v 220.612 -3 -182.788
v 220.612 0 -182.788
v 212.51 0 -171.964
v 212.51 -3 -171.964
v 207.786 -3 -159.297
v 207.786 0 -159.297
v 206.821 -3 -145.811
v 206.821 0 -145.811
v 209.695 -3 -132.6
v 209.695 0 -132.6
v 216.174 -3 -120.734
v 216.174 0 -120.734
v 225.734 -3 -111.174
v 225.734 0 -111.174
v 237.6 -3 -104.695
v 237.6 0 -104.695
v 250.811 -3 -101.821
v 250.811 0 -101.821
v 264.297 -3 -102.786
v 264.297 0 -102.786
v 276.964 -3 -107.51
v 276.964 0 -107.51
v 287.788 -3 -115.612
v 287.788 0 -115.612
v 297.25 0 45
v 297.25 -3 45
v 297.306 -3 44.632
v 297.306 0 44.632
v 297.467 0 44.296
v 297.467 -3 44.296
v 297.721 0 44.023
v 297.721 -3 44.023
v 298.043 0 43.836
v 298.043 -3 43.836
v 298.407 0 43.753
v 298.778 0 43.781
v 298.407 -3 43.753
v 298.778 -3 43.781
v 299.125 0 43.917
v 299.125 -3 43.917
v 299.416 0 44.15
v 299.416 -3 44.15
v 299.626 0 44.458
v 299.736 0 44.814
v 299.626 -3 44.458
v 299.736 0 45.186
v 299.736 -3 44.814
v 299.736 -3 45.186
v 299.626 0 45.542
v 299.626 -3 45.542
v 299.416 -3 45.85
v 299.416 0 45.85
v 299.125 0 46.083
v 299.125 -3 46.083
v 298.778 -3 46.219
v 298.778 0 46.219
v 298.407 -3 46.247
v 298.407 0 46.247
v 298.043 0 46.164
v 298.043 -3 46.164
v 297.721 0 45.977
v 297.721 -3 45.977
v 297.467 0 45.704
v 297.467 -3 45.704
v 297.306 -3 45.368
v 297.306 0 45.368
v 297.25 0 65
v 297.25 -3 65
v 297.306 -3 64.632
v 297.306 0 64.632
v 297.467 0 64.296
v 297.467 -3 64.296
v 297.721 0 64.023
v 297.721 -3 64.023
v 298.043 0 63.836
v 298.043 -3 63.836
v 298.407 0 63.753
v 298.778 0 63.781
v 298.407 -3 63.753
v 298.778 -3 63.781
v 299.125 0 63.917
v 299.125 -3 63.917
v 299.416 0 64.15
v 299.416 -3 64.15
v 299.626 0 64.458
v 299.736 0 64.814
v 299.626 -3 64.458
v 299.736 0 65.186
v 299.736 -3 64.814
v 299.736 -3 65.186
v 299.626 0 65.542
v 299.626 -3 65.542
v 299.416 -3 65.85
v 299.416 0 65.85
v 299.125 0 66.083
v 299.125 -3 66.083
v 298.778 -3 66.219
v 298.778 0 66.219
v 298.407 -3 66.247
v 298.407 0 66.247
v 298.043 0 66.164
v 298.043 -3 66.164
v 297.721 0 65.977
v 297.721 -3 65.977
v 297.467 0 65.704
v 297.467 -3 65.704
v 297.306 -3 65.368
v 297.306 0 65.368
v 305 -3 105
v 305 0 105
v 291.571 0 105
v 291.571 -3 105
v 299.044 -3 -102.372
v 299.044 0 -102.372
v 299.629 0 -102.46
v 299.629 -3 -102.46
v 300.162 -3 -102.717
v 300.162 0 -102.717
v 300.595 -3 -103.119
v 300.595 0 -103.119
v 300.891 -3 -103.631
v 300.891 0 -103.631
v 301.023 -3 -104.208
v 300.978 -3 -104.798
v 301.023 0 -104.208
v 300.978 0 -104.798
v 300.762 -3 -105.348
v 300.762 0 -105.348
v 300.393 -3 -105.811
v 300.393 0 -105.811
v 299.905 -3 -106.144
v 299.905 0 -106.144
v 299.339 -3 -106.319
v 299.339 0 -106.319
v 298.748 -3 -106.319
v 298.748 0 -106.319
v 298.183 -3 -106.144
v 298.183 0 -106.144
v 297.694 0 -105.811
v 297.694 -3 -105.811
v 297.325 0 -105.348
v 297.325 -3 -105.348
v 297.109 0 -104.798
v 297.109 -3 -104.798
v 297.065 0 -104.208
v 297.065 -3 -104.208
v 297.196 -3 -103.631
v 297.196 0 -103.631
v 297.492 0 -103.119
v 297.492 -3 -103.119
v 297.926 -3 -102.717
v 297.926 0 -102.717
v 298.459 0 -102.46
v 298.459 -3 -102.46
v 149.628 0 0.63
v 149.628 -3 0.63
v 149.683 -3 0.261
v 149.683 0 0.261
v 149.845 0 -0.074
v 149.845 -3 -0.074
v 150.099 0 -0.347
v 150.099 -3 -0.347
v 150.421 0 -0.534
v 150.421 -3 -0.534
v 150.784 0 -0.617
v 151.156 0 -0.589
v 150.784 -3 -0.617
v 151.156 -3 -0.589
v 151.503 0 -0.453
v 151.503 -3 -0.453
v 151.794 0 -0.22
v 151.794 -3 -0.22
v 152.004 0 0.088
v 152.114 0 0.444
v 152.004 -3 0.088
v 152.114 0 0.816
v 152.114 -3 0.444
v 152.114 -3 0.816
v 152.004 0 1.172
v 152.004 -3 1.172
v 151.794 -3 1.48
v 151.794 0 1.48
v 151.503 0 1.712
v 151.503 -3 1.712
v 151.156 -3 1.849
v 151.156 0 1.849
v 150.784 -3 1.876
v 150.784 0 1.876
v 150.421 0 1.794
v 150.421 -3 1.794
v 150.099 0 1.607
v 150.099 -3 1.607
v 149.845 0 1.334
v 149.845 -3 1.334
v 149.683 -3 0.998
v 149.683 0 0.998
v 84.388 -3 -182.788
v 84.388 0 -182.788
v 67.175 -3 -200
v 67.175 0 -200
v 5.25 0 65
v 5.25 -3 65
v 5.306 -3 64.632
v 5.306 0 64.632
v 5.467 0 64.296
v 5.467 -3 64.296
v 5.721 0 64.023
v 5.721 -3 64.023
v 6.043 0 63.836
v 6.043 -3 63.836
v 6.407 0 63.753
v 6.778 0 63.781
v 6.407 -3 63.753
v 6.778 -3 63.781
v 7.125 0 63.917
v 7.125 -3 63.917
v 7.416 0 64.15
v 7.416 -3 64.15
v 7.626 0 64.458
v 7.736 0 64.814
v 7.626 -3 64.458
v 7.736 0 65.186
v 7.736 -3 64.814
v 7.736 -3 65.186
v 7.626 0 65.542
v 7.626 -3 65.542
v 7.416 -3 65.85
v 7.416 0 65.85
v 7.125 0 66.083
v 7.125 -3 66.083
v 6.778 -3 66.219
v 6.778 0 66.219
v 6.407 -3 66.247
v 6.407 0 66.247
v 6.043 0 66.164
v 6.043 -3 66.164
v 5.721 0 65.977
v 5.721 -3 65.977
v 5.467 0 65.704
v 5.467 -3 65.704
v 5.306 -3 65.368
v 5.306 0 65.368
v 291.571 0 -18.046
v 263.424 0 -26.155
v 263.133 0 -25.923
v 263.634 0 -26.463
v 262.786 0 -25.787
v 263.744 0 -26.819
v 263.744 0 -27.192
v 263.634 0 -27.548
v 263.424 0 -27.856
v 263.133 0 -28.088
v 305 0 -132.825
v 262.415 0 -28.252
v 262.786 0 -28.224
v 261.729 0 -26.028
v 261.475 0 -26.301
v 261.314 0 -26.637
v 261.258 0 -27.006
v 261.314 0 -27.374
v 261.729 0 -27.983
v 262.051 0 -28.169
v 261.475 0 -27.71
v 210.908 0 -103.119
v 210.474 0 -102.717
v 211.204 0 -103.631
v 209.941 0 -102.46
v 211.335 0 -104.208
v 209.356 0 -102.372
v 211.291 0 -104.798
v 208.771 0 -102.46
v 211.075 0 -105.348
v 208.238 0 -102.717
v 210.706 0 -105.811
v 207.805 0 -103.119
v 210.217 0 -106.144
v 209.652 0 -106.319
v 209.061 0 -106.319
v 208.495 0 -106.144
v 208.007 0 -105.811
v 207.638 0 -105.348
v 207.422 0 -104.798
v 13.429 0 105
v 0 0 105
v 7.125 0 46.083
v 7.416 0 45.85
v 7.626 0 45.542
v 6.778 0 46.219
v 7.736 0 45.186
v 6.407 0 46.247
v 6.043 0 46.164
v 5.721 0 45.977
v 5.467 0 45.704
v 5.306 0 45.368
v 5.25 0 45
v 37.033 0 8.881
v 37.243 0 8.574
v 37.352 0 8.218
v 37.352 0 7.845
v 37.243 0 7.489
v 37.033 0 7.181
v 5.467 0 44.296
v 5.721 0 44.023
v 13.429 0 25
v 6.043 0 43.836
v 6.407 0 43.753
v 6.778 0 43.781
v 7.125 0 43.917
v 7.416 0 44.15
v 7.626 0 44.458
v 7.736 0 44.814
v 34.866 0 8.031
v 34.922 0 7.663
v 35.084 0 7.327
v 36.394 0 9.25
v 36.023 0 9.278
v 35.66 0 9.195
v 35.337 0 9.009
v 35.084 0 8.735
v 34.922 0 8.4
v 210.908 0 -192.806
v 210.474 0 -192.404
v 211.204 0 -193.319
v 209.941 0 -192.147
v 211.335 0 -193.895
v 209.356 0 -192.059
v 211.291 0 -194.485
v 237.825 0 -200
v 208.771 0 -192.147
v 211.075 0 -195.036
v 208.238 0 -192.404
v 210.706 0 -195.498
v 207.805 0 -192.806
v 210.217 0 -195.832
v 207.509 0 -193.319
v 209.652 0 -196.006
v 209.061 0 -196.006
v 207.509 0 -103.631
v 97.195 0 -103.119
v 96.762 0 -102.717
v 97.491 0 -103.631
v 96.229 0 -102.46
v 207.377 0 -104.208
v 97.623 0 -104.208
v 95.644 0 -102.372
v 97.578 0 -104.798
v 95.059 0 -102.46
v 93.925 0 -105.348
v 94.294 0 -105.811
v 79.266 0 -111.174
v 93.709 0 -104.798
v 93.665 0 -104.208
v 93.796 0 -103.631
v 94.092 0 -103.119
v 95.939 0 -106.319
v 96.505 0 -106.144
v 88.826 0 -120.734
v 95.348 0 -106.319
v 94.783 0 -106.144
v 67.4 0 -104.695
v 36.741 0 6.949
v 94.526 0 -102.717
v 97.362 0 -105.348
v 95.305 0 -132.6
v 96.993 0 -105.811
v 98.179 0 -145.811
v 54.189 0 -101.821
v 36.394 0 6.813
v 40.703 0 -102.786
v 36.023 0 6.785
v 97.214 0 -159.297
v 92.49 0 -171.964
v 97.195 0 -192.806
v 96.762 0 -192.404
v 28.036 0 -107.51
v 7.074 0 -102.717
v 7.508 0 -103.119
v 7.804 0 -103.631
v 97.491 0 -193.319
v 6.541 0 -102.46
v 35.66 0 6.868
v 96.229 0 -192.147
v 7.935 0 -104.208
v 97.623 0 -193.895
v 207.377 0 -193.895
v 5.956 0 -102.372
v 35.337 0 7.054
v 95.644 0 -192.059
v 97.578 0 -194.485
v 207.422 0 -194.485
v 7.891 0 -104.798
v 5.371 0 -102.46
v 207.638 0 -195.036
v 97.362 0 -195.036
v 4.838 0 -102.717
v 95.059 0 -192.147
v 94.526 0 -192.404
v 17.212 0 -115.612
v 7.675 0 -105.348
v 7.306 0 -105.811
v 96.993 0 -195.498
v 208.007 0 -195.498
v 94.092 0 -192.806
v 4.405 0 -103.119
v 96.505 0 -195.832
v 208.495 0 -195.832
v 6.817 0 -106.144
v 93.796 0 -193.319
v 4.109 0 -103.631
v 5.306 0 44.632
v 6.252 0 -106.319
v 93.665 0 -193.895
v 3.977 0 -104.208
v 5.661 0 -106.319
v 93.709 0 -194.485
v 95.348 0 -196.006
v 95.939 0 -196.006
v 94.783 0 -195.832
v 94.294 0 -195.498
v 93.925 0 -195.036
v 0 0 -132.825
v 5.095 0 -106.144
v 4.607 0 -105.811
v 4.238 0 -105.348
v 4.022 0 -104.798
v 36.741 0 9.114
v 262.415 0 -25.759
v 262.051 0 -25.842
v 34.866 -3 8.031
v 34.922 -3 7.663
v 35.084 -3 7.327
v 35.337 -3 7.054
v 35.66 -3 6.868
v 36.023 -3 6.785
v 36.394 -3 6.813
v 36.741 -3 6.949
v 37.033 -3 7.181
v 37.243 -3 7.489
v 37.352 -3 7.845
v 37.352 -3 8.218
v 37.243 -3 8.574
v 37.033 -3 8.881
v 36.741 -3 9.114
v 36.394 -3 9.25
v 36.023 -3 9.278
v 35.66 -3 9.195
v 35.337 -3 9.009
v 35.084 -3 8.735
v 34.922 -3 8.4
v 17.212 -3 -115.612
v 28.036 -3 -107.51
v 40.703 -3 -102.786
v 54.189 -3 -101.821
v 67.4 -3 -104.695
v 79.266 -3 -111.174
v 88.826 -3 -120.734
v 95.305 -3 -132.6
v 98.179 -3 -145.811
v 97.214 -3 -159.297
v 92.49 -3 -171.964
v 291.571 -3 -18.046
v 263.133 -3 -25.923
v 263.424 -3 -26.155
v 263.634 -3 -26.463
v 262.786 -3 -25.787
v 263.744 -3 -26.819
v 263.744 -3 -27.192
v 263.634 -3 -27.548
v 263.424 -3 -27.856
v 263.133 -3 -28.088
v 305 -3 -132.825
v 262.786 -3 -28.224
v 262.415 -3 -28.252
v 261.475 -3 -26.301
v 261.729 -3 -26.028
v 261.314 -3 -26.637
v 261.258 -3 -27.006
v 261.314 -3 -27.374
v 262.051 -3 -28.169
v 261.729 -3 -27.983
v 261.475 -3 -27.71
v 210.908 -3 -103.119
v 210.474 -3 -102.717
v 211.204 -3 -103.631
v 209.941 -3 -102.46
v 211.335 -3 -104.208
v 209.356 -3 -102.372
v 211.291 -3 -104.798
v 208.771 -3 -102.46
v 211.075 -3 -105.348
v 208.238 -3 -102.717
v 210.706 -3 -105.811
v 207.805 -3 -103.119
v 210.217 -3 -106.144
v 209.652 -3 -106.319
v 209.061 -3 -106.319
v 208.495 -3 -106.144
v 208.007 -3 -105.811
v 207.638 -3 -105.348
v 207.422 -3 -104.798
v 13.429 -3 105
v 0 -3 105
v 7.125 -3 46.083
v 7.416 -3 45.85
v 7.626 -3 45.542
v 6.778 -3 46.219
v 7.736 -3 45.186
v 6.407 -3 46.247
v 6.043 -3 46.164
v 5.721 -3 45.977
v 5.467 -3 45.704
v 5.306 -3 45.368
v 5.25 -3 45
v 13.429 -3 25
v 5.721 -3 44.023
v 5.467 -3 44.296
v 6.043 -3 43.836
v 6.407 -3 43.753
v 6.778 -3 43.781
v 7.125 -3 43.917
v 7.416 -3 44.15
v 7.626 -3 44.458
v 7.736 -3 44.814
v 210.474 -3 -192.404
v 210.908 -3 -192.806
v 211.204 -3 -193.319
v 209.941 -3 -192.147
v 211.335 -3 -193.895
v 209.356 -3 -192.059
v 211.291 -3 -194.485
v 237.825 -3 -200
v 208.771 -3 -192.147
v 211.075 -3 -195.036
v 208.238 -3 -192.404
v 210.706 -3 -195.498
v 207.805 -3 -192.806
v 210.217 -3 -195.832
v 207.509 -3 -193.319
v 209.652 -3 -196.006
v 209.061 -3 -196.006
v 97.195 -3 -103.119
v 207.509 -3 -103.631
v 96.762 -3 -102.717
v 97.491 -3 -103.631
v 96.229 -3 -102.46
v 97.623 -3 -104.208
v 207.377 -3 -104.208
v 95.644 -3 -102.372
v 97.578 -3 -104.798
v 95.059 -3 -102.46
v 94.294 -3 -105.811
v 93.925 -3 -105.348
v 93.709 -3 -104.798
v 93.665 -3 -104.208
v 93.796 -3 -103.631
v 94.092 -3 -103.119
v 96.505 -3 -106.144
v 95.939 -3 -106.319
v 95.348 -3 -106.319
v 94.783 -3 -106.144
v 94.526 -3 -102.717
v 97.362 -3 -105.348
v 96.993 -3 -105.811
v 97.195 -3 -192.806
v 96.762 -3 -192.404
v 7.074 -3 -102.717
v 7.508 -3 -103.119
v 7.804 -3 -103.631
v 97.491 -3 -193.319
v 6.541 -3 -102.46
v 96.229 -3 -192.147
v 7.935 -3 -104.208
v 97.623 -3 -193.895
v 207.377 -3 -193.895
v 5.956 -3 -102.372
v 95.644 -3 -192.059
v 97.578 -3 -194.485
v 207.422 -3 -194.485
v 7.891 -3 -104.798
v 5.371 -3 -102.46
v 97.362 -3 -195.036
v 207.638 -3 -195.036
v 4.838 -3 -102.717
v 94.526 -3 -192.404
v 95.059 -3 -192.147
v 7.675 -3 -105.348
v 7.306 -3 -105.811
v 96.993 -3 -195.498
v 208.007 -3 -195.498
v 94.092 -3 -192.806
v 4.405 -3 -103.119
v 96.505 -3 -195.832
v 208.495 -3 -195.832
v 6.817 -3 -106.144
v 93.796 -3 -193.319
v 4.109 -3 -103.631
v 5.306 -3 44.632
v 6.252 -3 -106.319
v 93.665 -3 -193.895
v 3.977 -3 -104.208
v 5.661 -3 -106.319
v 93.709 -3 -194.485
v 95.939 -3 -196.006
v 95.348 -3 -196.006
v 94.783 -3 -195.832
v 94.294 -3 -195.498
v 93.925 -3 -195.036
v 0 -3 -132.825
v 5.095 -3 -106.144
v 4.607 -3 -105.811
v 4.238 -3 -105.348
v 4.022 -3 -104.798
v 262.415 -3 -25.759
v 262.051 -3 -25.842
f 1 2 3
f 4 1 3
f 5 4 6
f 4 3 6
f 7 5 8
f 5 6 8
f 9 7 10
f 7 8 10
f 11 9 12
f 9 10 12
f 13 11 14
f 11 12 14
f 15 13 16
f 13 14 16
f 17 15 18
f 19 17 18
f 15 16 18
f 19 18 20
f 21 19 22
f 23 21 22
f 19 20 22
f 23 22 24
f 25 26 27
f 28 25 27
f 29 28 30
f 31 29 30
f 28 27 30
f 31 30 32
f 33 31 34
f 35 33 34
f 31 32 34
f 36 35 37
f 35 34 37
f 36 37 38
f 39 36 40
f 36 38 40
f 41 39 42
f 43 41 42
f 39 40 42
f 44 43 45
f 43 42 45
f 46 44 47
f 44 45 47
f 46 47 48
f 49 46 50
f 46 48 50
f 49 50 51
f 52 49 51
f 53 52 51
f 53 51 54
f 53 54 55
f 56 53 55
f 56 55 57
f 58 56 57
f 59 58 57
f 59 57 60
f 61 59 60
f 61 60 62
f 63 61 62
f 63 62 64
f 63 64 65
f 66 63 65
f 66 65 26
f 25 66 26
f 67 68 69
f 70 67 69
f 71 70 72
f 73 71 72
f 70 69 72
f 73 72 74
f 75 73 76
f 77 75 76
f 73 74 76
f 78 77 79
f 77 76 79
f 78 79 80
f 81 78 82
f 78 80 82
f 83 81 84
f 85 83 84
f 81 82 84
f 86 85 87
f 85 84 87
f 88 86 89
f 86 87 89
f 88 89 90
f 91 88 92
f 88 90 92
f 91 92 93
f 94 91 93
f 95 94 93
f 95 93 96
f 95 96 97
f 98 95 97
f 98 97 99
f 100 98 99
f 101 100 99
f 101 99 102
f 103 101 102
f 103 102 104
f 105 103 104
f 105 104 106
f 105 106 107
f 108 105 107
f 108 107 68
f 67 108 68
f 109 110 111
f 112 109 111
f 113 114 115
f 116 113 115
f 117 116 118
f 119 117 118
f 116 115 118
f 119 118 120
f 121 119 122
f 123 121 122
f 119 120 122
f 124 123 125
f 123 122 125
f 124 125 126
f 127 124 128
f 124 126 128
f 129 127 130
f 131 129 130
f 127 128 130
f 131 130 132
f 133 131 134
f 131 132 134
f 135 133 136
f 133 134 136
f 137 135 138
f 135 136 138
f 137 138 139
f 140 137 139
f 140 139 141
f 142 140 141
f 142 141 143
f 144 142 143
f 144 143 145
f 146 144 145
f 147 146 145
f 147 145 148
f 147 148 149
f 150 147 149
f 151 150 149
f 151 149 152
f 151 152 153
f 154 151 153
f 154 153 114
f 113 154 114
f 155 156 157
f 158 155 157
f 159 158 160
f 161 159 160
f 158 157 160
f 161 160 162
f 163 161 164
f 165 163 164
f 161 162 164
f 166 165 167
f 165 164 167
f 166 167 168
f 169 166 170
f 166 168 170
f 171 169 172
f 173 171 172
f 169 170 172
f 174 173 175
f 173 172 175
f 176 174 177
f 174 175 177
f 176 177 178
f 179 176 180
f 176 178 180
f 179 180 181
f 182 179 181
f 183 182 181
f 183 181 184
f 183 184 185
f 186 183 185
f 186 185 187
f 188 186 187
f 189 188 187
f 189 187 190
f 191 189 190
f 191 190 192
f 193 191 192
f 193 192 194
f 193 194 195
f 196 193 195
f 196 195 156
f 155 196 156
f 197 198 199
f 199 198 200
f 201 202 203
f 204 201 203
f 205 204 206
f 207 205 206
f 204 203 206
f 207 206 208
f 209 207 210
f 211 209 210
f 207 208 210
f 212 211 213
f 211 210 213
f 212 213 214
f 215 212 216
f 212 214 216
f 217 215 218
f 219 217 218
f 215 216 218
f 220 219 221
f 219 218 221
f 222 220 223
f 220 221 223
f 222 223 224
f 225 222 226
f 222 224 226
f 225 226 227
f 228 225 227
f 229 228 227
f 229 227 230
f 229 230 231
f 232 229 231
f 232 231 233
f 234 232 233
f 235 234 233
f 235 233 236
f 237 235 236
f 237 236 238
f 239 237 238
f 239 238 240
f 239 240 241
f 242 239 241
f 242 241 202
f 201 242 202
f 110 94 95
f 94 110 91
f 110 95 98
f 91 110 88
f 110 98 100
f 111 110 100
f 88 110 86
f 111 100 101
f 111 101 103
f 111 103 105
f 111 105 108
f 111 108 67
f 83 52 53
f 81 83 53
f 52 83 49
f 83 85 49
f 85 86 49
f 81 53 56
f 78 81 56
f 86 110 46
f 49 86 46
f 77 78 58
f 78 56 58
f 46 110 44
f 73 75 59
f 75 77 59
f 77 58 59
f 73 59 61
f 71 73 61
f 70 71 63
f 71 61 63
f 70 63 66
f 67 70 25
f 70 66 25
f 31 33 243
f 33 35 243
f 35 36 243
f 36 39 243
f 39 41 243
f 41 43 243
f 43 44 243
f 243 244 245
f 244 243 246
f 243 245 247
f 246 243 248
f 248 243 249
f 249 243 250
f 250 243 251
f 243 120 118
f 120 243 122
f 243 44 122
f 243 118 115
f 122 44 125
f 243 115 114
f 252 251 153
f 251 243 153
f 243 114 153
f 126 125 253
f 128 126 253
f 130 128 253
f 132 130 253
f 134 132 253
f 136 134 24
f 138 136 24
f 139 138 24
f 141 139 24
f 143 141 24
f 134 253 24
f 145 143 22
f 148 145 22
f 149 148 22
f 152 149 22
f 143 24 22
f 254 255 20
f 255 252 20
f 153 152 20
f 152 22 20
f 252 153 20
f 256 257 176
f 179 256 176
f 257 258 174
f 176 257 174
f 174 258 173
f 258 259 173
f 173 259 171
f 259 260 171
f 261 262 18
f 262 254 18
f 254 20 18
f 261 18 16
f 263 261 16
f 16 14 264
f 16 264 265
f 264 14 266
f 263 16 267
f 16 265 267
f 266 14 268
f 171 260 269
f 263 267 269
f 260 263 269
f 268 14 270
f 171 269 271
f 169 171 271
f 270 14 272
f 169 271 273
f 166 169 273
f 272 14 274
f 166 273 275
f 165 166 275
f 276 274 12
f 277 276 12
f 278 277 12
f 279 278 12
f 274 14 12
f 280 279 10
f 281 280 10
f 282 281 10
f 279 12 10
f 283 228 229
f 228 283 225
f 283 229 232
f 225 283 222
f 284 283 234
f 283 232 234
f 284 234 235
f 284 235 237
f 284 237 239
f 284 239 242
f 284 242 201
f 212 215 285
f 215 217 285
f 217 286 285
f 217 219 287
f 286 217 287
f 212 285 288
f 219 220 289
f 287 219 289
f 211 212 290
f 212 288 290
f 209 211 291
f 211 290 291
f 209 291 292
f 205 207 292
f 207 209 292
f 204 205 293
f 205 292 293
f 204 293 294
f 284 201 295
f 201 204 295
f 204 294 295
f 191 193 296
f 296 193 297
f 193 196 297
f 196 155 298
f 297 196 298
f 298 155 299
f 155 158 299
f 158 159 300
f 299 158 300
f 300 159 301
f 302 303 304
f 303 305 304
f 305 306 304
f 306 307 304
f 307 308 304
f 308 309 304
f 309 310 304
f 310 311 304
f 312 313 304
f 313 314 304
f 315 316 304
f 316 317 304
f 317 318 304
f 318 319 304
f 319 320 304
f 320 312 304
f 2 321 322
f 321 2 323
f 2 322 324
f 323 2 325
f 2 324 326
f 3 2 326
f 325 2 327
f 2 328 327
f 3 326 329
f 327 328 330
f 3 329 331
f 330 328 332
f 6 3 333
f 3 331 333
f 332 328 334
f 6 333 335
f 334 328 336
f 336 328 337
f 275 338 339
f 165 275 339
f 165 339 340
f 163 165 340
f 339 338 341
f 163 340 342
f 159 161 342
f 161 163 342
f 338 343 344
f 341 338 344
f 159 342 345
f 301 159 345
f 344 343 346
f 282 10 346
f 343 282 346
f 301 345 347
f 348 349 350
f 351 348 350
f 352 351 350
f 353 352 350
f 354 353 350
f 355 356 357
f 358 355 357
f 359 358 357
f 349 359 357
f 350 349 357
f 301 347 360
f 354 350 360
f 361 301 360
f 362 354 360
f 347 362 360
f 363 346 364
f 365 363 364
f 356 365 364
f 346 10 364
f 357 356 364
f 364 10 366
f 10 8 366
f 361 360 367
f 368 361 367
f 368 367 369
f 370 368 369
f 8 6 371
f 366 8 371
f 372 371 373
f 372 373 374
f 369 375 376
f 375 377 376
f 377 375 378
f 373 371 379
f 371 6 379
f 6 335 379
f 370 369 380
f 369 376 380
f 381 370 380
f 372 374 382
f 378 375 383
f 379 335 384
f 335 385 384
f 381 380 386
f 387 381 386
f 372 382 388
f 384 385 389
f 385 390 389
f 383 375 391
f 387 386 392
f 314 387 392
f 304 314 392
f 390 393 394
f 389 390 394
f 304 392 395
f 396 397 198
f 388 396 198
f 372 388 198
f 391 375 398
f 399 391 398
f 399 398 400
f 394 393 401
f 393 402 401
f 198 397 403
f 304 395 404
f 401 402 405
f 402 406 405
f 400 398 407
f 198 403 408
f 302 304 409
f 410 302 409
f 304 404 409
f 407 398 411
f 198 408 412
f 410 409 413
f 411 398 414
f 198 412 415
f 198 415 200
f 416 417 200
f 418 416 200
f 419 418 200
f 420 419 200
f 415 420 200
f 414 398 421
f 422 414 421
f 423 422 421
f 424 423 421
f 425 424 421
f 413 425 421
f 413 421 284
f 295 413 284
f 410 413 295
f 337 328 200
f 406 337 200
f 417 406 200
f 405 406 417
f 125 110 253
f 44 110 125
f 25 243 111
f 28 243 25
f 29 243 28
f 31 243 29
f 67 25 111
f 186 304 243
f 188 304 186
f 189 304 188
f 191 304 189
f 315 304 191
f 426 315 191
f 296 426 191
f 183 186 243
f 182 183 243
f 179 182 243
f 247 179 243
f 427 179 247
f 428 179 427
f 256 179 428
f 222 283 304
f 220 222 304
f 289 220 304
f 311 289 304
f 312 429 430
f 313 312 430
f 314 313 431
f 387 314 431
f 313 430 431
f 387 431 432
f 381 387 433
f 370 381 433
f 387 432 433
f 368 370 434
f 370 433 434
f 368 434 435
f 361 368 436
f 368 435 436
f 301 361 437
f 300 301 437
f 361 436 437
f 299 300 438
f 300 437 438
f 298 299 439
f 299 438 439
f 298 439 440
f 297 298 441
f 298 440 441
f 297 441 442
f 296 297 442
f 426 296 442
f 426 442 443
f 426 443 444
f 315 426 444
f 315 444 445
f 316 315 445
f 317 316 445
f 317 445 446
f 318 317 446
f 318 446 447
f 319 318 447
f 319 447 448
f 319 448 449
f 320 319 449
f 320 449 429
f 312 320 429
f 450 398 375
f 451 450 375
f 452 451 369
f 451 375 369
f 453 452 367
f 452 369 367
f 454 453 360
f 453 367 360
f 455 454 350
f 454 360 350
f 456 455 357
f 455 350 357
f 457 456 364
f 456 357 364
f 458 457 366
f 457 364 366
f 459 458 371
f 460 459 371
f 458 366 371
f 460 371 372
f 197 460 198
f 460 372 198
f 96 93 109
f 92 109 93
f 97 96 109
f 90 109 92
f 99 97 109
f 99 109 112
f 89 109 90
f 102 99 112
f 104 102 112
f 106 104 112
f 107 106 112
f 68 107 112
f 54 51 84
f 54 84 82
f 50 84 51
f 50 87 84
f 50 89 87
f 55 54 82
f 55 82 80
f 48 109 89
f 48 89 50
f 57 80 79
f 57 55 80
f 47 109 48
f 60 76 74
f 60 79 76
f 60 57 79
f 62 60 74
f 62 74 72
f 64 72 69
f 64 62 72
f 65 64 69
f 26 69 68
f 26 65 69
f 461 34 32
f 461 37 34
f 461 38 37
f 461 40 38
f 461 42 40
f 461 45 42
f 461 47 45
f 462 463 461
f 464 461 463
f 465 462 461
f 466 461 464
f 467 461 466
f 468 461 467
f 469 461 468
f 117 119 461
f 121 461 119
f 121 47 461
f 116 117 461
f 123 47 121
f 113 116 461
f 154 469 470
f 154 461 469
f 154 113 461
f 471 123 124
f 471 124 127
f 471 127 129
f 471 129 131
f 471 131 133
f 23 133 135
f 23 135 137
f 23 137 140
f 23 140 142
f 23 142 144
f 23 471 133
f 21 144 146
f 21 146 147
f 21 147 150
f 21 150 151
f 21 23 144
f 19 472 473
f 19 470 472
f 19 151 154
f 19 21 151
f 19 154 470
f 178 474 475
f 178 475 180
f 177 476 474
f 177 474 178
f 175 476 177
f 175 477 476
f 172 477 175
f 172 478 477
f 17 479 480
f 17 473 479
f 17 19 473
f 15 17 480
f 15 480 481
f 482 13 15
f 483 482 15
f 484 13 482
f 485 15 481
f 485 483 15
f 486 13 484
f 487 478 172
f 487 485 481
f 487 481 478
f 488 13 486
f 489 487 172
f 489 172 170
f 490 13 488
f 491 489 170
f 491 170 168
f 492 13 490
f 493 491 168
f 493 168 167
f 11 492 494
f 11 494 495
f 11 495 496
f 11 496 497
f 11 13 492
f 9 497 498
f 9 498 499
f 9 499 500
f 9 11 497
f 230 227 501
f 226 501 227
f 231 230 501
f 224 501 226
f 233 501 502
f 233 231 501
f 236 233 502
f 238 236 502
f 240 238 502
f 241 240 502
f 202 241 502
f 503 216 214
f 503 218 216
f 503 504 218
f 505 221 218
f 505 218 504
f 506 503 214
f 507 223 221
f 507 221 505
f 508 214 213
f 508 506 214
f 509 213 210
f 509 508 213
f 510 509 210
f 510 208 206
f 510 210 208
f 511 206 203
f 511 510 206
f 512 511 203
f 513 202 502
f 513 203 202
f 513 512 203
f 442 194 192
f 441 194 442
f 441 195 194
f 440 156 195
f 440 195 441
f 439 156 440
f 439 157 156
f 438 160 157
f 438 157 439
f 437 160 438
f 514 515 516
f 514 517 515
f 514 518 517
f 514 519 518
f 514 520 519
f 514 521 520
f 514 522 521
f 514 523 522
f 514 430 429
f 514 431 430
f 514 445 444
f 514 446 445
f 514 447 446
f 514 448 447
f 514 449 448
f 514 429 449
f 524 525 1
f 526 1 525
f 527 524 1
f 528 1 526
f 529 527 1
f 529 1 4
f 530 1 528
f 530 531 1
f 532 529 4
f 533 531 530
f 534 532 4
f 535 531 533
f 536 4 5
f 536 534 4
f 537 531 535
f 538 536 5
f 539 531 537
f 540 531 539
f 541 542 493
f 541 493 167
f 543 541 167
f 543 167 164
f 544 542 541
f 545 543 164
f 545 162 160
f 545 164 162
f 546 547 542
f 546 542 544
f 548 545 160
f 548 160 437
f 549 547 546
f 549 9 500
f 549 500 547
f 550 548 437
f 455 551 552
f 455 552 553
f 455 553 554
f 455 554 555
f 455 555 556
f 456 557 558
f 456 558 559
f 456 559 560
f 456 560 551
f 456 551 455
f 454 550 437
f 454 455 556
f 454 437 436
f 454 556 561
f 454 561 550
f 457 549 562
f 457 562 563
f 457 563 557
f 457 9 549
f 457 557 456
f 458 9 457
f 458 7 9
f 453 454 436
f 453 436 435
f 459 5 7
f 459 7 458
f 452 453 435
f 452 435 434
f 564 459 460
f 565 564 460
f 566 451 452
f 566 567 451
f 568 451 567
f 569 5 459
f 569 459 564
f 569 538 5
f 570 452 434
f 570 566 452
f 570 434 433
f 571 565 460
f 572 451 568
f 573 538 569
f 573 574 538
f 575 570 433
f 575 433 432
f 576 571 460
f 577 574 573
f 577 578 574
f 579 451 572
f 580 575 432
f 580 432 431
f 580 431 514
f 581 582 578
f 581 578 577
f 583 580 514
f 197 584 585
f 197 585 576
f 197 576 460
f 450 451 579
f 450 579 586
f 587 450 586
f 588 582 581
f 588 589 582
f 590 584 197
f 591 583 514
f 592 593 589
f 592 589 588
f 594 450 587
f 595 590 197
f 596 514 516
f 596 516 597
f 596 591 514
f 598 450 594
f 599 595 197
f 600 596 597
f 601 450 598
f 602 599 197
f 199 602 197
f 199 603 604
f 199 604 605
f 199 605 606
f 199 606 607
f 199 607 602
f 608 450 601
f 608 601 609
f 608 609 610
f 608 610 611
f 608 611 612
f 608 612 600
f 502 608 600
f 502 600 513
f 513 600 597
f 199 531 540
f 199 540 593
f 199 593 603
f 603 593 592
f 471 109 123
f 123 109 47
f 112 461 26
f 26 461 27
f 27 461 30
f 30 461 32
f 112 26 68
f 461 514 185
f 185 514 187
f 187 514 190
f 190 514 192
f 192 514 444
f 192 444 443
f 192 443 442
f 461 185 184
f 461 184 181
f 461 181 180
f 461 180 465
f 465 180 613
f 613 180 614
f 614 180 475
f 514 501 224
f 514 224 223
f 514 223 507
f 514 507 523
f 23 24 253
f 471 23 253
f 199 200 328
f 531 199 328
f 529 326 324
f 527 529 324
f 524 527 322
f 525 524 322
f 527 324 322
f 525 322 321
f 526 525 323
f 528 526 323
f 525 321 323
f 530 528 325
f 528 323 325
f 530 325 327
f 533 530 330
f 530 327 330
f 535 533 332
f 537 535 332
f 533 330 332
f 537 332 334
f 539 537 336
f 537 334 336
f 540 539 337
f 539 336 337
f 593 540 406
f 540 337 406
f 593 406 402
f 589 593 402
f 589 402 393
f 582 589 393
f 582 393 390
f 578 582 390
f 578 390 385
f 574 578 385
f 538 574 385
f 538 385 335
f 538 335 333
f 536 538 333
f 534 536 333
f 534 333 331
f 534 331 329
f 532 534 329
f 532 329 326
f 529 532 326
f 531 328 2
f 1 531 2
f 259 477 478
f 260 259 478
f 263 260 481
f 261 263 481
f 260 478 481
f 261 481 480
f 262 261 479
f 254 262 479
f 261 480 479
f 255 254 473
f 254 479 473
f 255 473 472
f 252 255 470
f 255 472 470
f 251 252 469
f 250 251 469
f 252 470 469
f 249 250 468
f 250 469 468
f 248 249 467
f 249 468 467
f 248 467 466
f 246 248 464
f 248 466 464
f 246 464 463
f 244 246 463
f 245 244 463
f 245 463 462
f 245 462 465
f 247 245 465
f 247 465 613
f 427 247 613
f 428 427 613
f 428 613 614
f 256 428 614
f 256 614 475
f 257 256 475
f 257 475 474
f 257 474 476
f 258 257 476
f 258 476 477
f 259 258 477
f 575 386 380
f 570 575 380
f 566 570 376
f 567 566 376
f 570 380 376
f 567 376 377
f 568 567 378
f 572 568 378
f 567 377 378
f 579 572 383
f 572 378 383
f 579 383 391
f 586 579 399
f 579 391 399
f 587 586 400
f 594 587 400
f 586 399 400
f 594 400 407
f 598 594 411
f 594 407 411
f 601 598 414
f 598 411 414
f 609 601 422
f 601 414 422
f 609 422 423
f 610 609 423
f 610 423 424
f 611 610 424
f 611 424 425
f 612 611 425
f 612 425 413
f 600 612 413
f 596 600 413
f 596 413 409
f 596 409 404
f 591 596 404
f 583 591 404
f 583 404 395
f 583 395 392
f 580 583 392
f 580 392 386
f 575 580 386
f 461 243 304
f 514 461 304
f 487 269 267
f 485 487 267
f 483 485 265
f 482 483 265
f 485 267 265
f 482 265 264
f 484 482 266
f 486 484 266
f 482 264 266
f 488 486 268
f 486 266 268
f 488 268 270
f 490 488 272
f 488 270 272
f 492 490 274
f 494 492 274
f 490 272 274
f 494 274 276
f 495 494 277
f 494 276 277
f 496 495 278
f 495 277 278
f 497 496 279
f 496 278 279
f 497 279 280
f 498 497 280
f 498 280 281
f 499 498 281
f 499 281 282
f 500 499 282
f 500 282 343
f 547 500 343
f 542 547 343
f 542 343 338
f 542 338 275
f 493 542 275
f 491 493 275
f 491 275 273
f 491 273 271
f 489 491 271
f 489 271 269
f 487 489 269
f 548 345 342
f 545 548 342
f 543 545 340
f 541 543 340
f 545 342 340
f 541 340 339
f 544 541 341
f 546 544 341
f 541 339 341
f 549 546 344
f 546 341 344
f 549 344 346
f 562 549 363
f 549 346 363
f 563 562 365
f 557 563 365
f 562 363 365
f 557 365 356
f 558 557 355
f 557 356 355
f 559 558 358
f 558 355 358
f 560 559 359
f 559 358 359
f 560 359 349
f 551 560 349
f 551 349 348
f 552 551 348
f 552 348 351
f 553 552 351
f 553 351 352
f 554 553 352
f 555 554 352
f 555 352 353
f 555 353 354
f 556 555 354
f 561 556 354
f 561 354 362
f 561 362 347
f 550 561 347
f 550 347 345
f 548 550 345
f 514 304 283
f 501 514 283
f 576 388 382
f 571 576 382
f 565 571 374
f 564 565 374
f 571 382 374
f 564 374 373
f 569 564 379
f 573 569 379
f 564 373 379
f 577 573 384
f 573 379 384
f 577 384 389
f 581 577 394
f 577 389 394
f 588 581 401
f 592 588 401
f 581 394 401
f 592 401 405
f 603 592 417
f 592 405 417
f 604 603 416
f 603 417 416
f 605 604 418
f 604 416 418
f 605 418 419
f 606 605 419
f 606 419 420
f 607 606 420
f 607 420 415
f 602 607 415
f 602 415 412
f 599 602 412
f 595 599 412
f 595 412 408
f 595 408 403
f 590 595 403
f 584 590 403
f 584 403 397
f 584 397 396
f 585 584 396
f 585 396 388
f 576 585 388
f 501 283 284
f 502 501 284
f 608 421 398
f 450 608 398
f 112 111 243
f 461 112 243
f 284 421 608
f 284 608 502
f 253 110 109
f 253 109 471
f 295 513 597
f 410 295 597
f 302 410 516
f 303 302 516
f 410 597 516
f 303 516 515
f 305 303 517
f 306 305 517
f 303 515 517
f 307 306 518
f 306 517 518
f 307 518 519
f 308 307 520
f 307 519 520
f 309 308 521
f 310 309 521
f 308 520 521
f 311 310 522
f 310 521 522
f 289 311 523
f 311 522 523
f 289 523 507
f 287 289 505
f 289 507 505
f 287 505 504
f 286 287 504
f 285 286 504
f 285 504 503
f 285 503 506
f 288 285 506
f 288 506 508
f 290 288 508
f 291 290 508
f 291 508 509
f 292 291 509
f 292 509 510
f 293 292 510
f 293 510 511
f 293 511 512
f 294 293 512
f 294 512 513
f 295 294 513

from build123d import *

# Parameters (mm, degrees)
BASE_FLANGE1_DEPTH    = 3
M3_TAPPED_HOLE1_D     = 2.5
M3_TAPPED_HOLE1_DEPTH = 7.5
M3_TAPPED_HOLE1_TIP   = 0.751075774
M3_TAPPED_HOLE2_D     = 2.5
M3_TAPPED_HOLE2_DEPTH = 7.5
M3_TAPPED_HOLE2_TIP   = 0.751075774
SKETCH11_R            = 47.5
SKETCH11_R_2          = 1.984375
CUT_EXTRUDE1_DEPTH    = 365.73826232


# Sheet-metal steps are written as plain solids
with BuildPart() as part:
    # Sketch1 → Base-Flange1 (new body)
    with BuildSketch(Plane(origin=(0, 0, 0), x_dir=(1, 0, 0), z_dir=(0, 1, 0))):
        Polygon((0, 0), (0, 200), (305, 200), (305, 35.309832976), (305, -105), (291.57115, -105), (291.57115, 18.045832093), (13.42885, -25), (13.42885, -105), (0, -105), align=None)
    extrude(amount=-BASE_FLANGE1_DEPTH)

    # M3 Tapped Hole1
    with Locations(Plane(origin=(0, 0, 0), x_dir=(1, 0, 0), z_dir=(0, 1, 0))):
        with Locations((6.5, -45), (6.5, -65), (298.5, -45), (298.5, -65)):
            Hole(M3_TAPPED_HOLE1_D / 2, depth=M3_TAPPED_HOLE1_DEPTH)
            with Locations((0, 0, -(M3_TAPPED_HOLE1_DEPTH + M3_TAPPED_HOLE1_TIP / 2))):  # 118° drill point
                Cone(0, M3_TAPPED_HOLE1_D / 2, M3_TAPPED_HOLE1_TIP, mode=Mode.SUBTRACT)

    # M3 Tapped Hole2
    with Locations(Plane(origin=(0, 0, 0), x_dir=(1, 0, 0), z_dir=(0, 1, 0))):
        with Locations((36.116318069, -8.031256885), (150.87789947, -0.629943868), (262.508000343, 27.005551046)):
            Hole(M3_TAPPED_HOLE2_D / 2, depth=M3_TAPPED_HOLE2_DEPTH)
            with Locations((0, 0, -(M3_TAPPED_HOLE2_DEPTH + M3_TAPPED_HOLE2_TIP / 2))):  # 118° drill point
                Cone(0, M3_TAPPED_HOLE2_D / 2, M3_TAPPED_HOLE2_TIP, mode=Mode.SUBTRACT)

    # Sketch11 → Cut-Extrude1 (cut, through all)
    with BuildSketch(Plane(origin=(0, 0, 0), x_dir=(1, 0, 0), z_dir=(0, 1, 0))):
        with BuildLine():
            Line((0, 200), (0, 132.824855788))
            Line((0, 132.824855788), (17.212427894, 115.612427894))
            ThreePointArc((17.212427894, 115.612427894), (17.212427894, 182.787572107), (84.387572107, 182.787572107))
            Line((84.387572107, 182.787572107), (67.175144213, 200))
            Line((67.175144213, 200), (0, 200))
        make_face()
        with Locations((50.8, 149.2)):
            Circle(SKETCH11_R)
        with Locations((254.2, 149.2)):
            Circle(SKETCH11_R)
        with BuildLine():
            Line((305, 200), (237.824855787, 200))
            Line((237.824855787, 200), (220.612427894, 182.787572106))
            ThreePointArc((220.612427894, 182.787572106), (272.377463037, 193.084277794), (301.7, 149.2))
            ThreePointArc((301.7, 149.2), (298.084277794, 131.022536963), (287.787572106, 115.612427894))
            Line((287.787572106, 115.612427894), (305, 132.824855787))
            Line((305, 132.824855787), (305, 200))
        make_face()
        with Locations(Location((95.6437, 194.0437, 0), (0, 0, 270))):
            Circle(SKETCH11_R_2)
        with Locations(Location((5.9563, 104.3563, 0), (0, 0, 270))):
            Circle(SKETCH11_R_2)
        with Locations(Location((95.6437, 104.3563, 0), (0, 0, 270))):
            Circle(SKETCH11_R_2)
        with Locations(Location((209.3563, 194.0437, 0), (0, 0, 270))):
            Circle(SKETCH11_R_2)
        with Locations(Location((209.3563, 104.3563, 0), (0, 0, 270))):
            Circle(SKETCH11_R_2)
        with Locations(Location((299.0437, 104.3563, 0), (0, 0, 270))):
            Circle(SKETCH11_R_2)
    extrude(amount=-CUT_EXTRUDE1_DEPTH, mode=Mode.SUBTRACT)


solid = part.part
